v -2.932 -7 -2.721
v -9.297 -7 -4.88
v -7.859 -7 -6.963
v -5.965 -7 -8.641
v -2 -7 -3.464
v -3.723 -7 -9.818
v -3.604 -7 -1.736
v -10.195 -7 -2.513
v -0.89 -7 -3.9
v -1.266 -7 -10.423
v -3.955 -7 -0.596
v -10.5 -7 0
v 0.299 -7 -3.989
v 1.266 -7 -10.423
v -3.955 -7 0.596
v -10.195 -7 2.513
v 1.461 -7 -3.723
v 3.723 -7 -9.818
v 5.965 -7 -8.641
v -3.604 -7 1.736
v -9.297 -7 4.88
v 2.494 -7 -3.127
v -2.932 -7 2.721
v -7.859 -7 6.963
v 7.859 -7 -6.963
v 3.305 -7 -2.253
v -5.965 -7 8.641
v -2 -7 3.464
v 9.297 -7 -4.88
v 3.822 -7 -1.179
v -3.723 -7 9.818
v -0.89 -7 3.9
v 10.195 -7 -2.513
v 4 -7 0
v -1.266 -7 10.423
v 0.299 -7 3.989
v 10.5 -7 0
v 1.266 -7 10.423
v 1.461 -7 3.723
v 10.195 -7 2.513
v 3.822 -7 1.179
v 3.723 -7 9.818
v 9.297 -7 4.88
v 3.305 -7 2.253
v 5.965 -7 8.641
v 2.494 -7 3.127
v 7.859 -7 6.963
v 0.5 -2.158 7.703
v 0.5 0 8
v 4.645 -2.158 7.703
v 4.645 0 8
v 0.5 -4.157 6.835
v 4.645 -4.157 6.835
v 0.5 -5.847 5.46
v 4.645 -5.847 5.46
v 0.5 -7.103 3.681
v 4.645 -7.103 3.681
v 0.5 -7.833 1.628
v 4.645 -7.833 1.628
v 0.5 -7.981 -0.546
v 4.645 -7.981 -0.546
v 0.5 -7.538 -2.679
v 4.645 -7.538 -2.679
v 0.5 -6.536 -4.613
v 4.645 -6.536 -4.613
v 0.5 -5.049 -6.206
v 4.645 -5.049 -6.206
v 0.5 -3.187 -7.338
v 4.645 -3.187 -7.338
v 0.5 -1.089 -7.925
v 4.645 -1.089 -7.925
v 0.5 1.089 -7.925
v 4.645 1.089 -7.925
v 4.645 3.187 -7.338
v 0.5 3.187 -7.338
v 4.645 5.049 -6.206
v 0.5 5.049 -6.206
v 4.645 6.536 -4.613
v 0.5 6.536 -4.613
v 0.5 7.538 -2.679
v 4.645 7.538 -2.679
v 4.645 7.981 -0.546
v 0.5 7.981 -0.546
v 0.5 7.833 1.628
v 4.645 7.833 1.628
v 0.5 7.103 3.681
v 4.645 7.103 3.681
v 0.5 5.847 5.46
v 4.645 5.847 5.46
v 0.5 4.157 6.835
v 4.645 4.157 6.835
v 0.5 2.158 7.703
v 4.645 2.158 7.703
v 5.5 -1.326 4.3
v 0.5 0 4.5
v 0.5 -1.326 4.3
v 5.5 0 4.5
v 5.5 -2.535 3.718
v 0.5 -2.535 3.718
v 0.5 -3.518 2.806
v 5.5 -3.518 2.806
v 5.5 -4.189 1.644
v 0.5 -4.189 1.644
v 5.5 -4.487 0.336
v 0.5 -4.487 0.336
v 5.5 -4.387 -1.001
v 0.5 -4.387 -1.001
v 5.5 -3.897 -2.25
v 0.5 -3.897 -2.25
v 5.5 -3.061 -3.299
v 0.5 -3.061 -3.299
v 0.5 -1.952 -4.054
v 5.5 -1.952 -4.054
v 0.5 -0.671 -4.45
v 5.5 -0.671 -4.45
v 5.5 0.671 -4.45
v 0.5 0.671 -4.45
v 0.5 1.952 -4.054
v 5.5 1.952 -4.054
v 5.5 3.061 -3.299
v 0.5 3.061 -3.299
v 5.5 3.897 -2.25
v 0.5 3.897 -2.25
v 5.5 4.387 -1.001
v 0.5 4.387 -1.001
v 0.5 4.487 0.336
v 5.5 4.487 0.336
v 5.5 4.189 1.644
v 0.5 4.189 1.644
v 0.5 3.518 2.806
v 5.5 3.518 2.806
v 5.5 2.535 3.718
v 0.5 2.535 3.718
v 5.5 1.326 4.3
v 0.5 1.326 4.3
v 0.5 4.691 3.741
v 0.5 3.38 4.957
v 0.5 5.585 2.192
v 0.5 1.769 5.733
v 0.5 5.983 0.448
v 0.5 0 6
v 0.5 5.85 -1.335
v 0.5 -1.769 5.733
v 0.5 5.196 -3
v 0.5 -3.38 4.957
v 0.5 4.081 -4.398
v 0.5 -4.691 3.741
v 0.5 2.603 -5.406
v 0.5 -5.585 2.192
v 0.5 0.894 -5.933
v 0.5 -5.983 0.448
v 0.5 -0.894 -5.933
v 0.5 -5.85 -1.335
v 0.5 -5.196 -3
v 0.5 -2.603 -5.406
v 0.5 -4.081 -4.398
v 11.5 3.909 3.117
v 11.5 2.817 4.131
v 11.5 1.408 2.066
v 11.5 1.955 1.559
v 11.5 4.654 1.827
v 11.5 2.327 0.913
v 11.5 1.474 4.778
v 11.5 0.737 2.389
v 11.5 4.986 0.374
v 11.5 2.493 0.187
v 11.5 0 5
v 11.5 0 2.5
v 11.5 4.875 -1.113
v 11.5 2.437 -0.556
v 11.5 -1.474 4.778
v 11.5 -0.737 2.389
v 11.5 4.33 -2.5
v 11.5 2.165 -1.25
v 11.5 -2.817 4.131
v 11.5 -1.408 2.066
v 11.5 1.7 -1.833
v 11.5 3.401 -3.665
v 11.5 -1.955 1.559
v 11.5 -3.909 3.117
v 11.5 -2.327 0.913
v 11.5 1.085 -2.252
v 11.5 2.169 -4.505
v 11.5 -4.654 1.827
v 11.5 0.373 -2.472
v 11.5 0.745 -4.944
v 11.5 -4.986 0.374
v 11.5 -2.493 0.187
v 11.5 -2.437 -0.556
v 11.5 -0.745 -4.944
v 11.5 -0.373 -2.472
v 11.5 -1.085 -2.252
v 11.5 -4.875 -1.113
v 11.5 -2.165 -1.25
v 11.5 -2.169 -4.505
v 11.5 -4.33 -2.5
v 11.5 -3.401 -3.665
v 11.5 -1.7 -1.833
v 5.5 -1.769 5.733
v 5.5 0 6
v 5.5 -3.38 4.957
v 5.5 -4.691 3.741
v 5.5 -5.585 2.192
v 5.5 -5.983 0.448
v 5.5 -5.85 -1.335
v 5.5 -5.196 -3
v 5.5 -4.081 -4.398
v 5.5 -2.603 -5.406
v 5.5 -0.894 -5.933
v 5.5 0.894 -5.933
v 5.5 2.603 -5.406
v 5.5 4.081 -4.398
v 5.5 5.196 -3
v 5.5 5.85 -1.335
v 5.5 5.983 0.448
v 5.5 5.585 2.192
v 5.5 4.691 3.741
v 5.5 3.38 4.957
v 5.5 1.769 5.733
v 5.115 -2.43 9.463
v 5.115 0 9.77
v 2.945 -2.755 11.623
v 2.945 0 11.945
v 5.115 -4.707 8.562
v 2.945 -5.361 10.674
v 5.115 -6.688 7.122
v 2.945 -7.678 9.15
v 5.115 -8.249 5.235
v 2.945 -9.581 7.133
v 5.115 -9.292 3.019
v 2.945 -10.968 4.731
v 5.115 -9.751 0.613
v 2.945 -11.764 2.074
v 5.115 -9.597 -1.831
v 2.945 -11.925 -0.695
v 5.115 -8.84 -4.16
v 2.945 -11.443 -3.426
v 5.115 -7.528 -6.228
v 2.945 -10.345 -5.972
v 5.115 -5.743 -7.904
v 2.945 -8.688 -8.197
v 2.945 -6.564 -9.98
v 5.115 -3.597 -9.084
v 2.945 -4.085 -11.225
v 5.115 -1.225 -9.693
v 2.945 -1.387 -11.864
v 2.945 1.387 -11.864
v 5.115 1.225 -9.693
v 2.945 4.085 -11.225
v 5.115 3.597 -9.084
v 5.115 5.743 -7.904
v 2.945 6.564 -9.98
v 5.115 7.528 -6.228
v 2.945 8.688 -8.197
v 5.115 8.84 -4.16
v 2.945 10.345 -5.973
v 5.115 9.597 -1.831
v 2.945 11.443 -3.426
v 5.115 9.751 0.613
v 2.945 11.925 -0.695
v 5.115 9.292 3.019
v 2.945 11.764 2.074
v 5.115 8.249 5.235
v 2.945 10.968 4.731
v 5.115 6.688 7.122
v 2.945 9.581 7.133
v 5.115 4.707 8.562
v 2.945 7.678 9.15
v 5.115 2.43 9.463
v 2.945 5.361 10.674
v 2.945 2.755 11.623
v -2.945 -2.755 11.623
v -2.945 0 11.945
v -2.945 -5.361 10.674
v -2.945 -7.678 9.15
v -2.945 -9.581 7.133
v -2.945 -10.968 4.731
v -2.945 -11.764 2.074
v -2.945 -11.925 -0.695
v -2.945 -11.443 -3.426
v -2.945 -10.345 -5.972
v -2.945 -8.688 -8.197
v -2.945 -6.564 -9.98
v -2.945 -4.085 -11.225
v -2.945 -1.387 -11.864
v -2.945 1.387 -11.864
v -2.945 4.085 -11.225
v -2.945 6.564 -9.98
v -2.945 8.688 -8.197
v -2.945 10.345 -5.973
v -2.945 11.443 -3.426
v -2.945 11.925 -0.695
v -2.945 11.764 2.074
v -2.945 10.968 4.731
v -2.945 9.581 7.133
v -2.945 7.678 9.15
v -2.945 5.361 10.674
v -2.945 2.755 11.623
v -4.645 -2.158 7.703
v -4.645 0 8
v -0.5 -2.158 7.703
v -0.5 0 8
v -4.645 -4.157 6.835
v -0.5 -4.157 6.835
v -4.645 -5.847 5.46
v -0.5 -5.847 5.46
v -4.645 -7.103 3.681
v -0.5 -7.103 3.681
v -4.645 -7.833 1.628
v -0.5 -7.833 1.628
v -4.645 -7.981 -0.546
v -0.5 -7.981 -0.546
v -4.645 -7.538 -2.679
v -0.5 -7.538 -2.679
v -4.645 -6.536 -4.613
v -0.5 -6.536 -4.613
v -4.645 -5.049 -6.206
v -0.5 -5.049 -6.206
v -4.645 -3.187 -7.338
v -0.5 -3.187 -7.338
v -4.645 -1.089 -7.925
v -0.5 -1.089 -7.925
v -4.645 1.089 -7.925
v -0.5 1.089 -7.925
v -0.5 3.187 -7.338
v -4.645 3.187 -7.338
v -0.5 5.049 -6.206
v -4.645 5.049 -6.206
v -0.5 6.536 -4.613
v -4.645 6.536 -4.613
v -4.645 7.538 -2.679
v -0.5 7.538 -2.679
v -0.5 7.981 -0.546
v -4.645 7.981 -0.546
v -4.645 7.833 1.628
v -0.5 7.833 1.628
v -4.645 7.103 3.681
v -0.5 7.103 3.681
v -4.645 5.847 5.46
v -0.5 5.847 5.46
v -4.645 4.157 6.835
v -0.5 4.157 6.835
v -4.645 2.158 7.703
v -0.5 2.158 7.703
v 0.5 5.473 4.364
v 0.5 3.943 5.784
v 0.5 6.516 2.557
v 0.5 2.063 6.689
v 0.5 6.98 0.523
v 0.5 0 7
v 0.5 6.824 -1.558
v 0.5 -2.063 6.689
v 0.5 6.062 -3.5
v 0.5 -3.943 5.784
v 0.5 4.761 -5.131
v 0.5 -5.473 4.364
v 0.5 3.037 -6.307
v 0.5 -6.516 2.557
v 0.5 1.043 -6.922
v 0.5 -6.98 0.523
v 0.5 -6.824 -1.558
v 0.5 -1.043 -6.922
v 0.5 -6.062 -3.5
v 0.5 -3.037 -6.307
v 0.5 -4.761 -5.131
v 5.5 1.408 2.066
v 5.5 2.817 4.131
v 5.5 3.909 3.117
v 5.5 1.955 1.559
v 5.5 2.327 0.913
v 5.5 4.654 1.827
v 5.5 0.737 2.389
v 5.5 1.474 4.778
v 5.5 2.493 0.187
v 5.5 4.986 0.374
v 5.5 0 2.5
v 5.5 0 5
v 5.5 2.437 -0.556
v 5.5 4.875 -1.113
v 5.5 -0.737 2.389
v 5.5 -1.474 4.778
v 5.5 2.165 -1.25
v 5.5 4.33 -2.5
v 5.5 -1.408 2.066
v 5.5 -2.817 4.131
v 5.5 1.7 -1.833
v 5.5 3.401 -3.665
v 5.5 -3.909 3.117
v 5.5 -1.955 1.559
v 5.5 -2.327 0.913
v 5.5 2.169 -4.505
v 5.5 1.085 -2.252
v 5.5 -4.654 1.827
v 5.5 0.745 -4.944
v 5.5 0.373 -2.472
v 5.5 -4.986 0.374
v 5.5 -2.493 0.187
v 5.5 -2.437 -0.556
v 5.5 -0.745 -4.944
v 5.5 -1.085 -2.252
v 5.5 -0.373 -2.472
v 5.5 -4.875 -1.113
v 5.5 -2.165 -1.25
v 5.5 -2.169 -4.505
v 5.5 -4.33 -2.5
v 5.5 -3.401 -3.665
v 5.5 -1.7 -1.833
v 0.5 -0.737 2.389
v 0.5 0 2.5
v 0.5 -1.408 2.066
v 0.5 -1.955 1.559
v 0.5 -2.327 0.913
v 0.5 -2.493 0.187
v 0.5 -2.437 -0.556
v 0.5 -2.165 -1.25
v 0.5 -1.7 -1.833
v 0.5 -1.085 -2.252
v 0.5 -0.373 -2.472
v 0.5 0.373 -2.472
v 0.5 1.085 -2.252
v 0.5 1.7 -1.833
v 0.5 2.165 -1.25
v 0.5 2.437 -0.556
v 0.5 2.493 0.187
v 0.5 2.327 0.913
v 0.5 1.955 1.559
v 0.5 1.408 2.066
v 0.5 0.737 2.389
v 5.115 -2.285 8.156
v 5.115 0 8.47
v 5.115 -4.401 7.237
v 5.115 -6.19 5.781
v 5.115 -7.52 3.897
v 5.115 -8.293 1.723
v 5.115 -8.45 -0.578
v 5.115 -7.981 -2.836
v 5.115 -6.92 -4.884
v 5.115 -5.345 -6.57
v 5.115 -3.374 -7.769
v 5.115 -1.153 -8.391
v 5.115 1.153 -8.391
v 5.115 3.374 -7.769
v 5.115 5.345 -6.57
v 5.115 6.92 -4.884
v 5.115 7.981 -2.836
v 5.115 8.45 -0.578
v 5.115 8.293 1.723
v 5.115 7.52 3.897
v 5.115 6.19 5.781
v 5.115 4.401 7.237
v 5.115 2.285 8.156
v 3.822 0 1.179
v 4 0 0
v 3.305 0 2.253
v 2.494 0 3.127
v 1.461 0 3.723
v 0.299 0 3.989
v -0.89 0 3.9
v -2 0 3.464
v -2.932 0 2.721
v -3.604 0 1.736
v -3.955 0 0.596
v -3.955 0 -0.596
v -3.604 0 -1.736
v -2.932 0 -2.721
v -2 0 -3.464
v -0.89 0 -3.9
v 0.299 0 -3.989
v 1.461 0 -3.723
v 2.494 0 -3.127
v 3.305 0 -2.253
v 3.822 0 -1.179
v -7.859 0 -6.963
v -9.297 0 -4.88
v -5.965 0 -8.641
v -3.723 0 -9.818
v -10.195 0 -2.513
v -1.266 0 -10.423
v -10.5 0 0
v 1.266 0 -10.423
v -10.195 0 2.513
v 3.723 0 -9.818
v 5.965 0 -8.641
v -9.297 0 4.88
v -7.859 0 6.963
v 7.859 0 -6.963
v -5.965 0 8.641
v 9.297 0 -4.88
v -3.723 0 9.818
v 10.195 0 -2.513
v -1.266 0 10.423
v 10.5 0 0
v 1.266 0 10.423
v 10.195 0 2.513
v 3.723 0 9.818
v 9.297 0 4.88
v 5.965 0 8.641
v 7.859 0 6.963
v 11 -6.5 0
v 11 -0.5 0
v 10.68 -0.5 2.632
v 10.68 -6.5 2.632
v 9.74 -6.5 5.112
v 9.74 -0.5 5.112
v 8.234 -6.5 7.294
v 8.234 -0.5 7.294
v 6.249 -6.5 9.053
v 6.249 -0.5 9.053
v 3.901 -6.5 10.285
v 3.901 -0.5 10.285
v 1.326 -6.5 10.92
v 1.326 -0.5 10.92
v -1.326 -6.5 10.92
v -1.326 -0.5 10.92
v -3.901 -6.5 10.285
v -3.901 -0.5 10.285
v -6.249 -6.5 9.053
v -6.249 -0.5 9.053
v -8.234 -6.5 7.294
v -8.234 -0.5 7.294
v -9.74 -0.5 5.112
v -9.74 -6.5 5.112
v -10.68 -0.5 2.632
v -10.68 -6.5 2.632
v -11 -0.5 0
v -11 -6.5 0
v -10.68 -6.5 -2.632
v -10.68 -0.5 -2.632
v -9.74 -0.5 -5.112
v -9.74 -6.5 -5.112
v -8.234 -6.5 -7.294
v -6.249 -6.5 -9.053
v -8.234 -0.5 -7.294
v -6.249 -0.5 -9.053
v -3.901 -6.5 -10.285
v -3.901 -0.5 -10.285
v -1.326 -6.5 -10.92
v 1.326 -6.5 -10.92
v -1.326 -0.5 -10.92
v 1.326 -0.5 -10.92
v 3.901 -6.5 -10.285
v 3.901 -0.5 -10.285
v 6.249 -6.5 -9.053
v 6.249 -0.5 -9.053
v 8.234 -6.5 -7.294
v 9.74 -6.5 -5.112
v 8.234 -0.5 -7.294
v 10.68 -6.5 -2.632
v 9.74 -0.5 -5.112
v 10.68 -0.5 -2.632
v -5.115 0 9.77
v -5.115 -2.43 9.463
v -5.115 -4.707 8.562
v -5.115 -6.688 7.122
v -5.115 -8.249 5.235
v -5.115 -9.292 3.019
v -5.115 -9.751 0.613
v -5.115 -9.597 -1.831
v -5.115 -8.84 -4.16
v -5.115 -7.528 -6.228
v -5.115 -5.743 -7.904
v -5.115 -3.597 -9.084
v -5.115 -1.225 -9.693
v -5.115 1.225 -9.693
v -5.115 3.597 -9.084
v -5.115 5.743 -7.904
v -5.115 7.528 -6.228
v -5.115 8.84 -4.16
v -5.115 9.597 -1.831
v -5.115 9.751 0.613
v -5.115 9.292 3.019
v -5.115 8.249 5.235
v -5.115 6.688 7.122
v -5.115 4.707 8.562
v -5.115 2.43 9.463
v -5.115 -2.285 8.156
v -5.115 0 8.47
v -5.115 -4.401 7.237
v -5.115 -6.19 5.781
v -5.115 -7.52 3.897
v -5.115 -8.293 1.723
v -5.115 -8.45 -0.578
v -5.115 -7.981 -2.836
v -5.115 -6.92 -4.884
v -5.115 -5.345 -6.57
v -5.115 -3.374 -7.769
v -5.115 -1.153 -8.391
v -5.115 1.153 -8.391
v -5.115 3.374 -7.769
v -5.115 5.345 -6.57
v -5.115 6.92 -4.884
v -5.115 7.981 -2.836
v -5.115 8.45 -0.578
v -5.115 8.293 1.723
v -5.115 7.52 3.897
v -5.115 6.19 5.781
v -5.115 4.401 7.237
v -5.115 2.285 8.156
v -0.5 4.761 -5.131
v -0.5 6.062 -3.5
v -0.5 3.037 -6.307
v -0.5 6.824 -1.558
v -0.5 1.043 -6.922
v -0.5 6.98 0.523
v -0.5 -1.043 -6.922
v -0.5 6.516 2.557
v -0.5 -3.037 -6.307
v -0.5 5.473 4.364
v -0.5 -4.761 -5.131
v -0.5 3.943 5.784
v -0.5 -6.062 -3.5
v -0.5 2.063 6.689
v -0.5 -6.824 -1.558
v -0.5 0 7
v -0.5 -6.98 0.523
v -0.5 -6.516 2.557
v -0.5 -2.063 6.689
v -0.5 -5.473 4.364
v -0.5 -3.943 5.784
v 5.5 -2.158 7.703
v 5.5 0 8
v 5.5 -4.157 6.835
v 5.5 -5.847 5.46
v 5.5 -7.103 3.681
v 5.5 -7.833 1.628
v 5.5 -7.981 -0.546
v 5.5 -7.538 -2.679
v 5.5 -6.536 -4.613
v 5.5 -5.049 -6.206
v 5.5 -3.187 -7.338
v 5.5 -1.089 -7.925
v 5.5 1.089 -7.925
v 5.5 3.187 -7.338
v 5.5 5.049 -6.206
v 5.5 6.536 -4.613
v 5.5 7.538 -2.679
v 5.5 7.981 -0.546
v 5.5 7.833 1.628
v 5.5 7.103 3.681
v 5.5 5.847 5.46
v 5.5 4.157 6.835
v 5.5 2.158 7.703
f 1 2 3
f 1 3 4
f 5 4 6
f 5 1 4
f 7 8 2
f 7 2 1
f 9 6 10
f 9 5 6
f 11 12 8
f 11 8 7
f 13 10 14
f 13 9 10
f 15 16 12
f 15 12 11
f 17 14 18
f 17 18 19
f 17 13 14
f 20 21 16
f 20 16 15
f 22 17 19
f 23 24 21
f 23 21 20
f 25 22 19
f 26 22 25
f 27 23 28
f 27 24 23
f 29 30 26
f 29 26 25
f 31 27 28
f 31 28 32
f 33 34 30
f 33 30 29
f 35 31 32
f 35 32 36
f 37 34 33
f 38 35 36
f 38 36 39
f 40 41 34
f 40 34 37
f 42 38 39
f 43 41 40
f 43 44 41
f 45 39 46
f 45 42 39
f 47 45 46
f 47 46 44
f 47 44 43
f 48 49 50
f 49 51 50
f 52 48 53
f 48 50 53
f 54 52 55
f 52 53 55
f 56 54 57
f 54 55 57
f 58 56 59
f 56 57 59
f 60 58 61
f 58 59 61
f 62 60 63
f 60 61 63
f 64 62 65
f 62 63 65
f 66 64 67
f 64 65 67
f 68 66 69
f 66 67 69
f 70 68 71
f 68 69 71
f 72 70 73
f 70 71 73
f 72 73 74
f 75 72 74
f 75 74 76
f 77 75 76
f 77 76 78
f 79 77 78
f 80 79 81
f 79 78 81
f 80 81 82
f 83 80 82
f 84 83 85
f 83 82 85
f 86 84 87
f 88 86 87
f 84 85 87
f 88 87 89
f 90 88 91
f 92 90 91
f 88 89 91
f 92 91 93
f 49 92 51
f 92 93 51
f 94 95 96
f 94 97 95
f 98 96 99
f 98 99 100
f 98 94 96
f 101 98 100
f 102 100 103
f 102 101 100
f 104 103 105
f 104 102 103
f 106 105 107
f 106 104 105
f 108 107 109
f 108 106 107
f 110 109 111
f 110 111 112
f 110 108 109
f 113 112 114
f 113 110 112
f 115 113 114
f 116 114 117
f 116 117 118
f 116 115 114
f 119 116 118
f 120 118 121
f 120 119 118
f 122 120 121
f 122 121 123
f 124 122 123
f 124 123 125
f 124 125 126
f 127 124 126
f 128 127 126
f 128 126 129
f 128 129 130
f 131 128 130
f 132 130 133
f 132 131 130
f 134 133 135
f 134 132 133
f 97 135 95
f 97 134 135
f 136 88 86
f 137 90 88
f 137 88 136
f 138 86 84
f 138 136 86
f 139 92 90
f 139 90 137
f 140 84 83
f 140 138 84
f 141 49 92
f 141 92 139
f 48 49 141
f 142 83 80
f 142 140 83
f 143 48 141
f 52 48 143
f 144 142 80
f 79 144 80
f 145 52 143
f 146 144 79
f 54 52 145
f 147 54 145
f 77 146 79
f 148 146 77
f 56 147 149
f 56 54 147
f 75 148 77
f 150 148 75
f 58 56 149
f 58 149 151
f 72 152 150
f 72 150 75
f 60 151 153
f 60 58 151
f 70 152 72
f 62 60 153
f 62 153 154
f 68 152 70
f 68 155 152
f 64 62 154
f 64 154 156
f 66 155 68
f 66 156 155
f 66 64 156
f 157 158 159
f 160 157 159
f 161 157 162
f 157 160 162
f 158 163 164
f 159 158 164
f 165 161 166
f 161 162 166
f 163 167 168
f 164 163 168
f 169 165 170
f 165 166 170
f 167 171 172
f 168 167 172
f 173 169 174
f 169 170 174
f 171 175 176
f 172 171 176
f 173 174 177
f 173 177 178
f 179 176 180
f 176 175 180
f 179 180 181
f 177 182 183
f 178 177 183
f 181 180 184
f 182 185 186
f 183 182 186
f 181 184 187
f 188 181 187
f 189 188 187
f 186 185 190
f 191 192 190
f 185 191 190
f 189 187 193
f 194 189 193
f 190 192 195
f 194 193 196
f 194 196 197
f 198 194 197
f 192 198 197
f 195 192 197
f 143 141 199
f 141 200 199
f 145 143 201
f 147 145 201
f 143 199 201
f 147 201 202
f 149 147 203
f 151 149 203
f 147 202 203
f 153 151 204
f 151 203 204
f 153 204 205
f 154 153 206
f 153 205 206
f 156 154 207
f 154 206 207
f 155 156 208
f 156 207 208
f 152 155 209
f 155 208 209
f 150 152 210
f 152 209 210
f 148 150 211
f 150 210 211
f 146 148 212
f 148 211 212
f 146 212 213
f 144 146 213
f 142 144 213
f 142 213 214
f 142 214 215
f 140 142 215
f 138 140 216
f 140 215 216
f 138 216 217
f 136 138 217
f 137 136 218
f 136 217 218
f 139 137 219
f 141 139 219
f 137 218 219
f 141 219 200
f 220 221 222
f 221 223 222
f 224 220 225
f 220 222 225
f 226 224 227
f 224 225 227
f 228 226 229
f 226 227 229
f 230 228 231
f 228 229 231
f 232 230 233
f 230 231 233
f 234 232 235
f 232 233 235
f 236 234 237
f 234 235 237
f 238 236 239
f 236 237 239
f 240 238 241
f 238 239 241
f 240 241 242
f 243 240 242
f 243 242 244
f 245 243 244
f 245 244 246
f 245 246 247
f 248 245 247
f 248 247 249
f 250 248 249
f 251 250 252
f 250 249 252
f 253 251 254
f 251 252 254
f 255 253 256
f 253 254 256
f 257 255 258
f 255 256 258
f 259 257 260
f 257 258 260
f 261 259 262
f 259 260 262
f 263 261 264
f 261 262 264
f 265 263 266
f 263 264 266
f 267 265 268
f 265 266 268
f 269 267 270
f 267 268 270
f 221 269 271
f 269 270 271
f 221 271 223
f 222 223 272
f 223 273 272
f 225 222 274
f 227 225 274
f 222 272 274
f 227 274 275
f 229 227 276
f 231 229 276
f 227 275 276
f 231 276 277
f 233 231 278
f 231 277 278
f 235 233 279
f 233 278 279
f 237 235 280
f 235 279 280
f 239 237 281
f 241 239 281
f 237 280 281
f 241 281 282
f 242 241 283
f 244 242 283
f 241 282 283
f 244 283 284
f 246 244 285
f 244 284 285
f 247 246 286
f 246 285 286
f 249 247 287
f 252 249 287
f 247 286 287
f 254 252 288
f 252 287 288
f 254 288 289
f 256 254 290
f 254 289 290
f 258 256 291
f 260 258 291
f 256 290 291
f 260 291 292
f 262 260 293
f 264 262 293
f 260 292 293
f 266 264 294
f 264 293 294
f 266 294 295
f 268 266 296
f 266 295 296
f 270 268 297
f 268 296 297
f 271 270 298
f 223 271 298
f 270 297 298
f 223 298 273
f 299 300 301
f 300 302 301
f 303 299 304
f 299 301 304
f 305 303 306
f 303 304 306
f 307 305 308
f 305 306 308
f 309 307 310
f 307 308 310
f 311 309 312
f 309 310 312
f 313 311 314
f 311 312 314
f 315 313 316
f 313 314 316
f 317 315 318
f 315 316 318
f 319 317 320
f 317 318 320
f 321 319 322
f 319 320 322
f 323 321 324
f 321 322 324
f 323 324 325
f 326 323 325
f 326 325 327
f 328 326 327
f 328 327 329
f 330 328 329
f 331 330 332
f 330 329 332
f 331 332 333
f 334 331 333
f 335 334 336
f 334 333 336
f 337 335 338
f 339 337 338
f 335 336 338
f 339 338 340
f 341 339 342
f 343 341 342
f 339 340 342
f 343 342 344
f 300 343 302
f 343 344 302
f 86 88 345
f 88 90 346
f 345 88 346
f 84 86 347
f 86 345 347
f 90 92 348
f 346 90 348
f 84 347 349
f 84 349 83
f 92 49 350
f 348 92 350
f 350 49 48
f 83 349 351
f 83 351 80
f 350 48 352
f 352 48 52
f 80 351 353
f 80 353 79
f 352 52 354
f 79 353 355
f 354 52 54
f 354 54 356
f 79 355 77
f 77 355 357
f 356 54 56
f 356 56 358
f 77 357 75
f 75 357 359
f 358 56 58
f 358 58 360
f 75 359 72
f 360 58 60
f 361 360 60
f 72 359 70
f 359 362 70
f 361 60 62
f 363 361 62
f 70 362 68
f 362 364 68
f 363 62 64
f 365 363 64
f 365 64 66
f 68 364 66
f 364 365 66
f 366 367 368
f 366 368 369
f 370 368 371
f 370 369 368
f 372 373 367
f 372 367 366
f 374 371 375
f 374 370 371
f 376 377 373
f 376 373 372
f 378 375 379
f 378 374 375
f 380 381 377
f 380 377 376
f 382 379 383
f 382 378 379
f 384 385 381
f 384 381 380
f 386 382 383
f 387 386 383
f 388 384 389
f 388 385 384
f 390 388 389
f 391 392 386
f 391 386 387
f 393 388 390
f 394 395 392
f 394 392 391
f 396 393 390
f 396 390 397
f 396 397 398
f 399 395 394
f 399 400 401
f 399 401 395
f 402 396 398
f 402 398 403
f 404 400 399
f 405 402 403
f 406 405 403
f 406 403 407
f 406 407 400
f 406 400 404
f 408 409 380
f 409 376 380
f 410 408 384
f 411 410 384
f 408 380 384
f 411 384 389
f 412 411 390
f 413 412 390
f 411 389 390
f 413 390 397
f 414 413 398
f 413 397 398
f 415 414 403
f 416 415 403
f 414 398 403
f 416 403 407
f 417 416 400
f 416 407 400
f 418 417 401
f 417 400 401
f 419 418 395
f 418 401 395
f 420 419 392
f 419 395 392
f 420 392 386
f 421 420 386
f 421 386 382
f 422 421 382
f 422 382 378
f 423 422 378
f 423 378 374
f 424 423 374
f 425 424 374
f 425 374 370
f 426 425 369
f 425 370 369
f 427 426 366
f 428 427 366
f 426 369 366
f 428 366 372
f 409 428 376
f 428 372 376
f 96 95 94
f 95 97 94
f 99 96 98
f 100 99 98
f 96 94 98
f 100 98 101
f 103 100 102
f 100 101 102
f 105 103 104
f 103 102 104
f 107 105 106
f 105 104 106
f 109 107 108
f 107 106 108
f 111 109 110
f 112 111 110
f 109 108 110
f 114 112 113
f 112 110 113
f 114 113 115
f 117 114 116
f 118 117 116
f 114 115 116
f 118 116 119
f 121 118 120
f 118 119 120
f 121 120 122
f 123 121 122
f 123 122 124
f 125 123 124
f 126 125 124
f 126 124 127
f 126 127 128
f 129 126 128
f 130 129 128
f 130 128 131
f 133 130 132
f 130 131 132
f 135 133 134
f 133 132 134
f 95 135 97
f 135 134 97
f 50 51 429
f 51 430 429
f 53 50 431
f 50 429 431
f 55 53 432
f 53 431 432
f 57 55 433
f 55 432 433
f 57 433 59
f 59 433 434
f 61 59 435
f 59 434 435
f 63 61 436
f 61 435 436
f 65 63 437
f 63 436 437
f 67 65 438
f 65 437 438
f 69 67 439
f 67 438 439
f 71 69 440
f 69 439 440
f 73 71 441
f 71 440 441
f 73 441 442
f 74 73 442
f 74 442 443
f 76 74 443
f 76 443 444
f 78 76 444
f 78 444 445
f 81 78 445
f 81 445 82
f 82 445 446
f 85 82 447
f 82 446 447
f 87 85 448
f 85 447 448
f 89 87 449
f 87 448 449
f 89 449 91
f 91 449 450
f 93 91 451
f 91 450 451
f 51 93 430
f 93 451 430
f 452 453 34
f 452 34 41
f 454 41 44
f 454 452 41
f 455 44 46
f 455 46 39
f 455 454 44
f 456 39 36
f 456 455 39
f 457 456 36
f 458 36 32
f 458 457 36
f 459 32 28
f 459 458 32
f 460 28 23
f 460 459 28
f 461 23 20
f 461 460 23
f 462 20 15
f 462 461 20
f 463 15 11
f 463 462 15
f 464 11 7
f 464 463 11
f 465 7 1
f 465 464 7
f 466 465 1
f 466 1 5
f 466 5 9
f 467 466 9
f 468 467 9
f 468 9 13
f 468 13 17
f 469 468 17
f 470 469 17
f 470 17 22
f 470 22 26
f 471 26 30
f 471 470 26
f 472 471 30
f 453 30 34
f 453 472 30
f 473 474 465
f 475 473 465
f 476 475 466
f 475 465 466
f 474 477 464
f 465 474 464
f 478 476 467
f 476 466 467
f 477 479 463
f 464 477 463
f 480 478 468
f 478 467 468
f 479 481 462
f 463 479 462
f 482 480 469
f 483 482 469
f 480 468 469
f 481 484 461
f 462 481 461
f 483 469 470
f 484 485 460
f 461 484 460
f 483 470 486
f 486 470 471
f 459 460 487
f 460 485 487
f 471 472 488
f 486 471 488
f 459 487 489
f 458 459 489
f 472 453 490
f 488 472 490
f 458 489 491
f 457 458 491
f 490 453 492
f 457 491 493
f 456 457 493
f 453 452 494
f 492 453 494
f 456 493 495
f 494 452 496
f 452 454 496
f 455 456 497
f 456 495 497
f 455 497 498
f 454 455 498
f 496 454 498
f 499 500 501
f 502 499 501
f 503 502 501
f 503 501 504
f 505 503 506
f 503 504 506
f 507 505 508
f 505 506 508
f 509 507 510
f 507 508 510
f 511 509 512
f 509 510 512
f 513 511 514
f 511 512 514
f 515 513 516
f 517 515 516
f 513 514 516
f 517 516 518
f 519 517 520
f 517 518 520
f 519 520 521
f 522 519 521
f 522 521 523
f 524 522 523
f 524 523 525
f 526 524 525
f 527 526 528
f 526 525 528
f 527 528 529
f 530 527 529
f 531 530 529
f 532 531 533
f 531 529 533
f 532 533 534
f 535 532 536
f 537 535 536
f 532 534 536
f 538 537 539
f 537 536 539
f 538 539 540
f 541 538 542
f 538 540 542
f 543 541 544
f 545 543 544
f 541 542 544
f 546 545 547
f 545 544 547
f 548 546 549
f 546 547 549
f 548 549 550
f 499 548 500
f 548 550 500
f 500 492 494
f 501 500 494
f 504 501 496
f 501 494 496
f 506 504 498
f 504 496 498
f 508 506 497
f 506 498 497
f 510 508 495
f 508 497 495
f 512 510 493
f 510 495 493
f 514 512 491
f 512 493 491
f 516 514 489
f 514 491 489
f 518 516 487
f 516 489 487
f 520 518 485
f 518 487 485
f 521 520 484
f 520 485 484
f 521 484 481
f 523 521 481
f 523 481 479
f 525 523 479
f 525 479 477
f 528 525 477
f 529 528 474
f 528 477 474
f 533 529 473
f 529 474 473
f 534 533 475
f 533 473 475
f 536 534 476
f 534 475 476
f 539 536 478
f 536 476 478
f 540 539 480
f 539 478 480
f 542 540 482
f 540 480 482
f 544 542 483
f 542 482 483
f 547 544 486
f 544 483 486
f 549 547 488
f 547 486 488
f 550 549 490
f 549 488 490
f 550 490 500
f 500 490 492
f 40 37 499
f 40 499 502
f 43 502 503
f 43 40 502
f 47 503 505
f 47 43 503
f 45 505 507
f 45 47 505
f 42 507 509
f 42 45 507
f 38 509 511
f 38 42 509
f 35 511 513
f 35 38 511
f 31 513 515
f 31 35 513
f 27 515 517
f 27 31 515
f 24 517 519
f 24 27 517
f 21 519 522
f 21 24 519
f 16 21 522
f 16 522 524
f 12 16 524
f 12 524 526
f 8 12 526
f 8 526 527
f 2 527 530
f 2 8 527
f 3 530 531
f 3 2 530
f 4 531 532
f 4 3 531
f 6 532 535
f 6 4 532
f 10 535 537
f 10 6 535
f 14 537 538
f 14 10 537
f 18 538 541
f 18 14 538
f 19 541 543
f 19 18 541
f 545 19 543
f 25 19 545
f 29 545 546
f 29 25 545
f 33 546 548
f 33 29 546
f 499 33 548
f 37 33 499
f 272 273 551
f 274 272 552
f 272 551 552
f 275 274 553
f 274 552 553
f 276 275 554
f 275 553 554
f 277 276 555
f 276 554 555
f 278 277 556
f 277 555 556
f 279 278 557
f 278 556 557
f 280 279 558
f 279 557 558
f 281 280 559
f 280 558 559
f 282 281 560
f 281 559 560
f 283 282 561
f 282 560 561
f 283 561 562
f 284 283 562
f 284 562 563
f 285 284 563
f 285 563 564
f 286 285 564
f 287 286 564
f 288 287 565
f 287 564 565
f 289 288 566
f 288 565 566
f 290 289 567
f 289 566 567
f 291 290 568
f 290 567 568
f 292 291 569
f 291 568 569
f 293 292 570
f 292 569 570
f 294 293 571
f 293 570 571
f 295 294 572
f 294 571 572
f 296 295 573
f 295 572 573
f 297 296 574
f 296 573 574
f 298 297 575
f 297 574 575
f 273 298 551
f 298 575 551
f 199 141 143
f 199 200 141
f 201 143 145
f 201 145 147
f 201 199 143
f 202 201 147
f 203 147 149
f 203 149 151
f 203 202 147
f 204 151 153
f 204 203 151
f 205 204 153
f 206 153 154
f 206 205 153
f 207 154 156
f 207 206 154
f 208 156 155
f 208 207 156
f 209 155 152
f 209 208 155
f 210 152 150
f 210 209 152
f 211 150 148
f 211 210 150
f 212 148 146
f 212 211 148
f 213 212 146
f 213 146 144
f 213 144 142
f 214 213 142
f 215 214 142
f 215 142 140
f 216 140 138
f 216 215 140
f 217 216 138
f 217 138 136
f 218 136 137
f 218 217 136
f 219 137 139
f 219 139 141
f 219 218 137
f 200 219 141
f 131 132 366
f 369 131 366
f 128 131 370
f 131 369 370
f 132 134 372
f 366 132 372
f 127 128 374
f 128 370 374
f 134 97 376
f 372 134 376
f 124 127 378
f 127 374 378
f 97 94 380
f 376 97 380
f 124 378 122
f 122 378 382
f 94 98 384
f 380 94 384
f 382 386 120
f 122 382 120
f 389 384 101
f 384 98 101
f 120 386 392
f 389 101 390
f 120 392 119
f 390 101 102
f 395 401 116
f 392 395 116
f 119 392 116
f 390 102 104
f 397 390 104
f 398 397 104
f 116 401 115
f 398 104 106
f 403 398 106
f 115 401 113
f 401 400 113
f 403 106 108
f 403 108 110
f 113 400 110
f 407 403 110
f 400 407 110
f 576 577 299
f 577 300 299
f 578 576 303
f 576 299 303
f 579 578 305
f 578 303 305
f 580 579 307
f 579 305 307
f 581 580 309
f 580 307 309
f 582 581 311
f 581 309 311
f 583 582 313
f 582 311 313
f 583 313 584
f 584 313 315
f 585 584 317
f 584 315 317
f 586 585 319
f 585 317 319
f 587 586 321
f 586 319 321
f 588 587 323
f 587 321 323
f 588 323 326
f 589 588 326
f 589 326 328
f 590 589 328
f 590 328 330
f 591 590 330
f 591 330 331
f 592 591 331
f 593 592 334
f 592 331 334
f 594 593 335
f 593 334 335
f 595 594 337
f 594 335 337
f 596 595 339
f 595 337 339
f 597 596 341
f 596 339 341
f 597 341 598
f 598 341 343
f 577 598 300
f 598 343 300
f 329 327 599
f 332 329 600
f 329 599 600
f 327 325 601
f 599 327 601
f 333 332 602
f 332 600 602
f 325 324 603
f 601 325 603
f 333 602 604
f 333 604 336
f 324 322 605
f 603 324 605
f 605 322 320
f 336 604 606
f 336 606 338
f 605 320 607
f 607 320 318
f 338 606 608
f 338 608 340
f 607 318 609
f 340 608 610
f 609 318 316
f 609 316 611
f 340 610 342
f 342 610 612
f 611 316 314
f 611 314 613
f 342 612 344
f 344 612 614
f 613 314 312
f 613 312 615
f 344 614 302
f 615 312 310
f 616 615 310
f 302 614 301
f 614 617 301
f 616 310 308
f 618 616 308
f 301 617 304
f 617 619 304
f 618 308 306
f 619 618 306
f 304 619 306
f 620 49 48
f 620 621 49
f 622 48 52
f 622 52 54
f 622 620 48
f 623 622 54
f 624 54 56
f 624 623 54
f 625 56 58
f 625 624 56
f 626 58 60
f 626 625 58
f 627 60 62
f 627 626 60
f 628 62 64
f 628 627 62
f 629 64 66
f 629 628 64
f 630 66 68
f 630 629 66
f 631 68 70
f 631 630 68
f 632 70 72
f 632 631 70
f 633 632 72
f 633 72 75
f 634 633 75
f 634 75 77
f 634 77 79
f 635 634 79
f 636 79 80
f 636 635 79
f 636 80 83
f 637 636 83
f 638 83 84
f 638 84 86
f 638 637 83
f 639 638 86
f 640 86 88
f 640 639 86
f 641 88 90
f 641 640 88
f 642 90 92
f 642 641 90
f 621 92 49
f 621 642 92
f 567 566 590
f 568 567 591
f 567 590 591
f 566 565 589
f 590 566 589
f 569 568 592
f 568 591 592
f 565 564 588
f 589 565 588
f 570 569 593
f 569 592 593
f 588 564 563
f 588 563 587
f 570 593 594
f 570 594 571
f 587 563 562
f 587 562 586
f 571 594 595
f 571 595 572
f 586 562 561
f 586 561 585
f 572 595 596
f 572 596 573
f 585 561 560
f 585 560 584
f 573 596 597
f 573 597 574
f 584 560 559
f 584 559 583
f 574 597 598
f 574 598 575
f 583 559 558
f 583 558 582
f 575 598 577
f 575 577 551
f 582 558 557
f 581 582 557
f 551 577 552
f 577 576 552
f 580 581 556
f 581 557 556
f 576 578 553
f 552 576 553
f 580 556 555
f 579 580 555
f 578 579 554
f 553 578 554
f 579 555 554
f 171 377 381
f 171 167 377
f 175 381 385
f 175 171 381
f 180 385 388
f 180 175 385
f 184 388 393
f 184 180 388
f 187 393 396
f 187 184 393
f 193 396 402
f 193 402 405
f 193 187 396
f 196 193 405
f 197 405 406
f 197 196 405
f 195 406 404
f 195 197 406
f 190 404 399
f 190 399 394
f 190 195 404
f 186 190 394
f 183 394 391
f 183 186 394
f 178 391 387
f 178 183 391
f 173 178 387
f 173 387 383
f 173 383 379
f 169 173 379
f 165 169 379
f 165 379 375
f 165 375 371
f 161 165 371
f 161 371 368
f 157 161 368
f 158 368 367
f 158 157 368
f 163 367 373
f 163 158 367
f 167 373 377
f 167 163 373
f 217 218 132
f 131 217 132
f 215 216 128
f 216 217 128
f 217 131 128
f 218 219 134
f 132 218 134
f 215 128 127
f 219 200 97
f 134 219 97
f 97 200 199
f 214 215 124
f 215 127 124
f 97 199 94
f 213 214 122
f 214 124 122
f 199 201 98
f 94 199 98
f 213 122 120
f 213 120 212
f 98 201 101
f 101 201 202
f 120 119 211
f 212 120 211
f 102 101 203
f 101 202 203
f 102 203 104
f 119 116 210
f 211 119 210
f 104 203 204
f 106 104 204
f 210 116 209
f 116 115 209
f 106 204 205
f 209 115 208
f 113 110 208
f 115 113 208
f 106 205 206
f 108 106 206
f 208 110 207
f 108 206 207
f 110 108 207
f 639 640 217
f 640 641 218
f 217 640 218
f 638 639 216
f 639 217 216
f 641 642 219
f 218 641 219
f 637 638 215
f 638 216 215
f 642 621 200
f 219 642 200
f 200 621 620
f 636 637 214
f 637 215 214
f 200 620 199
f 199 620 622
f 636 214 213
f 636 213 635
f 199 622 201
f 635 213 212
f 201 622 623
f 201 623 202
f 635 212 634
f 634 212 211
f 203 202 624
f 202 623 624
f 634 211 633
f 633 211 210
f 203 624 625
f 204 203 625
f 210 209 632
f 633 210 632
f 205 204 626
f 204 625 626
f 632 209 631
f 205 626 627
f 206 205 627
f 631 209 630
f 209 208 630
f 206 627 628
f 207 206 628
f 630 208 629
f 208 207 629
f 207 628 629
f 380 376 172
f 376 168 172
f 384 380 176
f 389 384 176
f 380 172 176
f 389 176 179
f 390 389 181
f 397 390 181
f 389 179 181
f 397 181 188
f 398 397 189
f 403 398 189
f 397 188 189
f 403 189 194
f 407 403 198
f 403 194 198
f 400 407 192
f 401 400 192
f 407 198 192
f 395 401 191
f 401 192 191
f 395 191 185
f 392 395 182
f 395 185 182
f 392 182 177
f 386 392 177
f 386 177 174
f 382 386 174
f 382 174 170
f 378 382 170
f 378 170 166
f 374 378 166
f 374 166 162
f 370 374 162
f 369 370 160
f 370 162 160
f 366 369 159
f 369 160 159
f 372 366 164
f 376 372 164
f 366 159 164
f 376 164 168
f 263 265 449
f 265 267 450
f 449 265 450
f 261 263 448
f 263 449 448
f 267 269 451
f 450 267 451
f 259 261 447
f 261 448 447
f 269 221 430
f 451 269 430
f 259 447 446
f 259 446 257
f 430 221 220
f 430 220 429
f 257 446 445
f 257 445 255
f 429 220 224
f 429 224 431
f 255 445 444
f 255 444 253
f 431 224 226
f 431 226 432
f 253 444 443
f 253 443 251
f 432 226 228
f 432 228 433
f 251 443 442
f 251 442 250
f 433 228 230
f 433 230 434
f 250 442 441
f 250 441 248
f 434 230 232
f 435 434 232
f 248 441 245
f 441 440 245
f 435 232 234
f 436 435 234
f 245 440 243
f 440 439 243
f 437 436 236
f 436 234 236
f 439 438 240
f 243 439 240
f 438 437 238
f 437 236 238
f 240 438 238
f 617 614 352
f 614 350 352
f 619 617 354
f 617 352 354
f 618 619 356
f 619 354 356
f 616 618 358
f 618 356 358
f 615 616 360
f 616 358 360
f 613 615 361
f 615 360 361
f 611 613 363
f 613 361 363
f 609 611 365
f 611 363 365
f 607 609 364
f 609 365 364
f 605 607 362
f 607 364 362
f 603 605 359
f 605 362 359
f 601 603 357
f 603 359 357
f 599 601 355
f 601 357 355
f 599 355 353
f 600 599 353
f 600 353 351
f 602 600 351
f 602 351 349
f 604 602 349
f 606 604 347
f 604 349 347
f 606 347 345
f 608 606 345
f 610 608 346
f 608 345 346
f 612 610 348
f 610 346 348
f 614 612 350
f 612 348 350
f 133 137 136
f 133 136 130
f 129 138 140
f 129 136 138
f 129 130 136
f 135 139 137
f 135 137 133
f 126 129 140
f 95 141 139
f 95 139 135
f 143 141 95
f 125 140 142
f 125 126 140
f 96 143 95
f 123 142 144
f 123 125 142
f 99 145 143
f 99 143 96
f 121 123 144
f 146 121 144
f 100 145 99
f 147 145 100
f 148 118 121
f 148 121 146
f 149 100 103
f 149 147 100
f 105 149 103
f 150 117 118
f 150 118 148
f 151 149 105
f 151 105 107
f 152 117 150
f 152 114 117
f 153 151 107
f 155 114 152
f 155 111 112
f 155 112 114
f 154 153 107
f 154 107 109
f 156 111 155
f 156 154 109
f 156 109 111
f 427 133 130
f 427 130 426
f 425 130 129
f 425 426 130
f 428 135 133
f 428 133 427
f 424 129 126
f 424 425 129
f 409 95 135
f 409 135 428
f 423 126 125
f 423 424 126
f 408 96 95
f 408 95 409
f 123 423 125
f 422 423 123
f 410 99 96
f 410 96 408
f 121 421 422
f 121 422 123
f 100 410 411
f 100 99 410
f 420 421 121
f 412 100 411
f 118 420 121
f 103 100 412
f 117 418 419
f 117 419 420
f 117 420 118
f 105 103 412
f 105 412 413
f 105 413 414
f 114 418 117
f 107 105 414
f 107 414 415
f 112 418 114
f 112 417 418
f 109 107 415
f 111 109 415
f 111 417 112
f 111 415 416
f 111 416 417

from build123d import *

# Parameters (mm, degrees)
F1_W     = 5
F1_H     = 2
F1_H_2   = 1.5
F2_W     = 6
F2_H     = 2.5
F8_R     = 11
F8_R_2   = 4
F9_DEPTH = 7
F10_SIZE = 0.5


# Not quite as in the source:
# - a feature names something its author has since deleted; it is built from what else it names


with BuildPart() as f3:
    # F0 (on Front) → F3 (revolve)
    with BuildSketch(Plane.XZ):
        Polygon((2.945, 11.945), (-2.945, 11.945), (-5.115, 9.77), (-5.115, 8.47), (-4.645, 8), (-0.5, 8), (-0.5, 7), (0.5, 7), (0.5, 8), (4.645, 8), (5.115, 8.47), (5.115, 9.77), align=None)
    revolve(axis=Axis((0.0770290499, 0, 0), (1, 0, 0)))


with BuildPart() as f4:
    # F1 (on Front) → F4 (revolve)
    with BuildSketch(Plane.XZ):
        with Locations((3, 7)):
            Rectangle(F1_W, F1_H)
    revolve(axis=Axis((0.0770290499, 0, 0), (1, 0, 0)))


with BuildPart() as f5:
    # F1 (on Front) → F5 (revolve)
    with BuildSketch(Plane.XZ):
        with Locations((3, 5.25)):
            Rectangle(F1_W, F1_H_2)
    revolve(axis=Axis((0.0770290499, 0, 0), (1, 0, 0)))


with BuildPart() as f6:
    # F1 (on Front) → F6 (revolve)
    with BuildSketch(Plane.XZ):
        with Locations((3, 3.5)):
            Rectangle(F1_W, F1_H)
    revolve(axis=Axis((0.0770290499, 0, 0), (1, 0, 0)))


with BuildPart() as f7:
    # F2 (on Front) → F7 (revolve)
    with BuildSketch(Plane.XZ):
        with Locations((8.5, 3.75)):
            Rectangle(F2_W, F2_H)
    revolve(axis=Axis((0.0770290499, 0, 0), (1, 0, 0)))


with BuildPart() as f9:
    # F8 (on Front) → F9 (new body)
    with BuildSketch(Plane.XZ):
        Circle(F8_R)
        Circle(F8_R_2, mode=Mode.SUBTRACT)
    extrude(amount=F9_DEPTH)

    # F10
    f10_edges = [f9.edges().sort_by_distance(p)[0] for p in [
        (-11, -7, 0),
        (-11, 0, 0),
    ]]
    chamfer(f10_edges, length=F10_SIZE)


solid = Compound([f3.part, f4.part, f5.part, f6.part, f7.part, f9.part])
